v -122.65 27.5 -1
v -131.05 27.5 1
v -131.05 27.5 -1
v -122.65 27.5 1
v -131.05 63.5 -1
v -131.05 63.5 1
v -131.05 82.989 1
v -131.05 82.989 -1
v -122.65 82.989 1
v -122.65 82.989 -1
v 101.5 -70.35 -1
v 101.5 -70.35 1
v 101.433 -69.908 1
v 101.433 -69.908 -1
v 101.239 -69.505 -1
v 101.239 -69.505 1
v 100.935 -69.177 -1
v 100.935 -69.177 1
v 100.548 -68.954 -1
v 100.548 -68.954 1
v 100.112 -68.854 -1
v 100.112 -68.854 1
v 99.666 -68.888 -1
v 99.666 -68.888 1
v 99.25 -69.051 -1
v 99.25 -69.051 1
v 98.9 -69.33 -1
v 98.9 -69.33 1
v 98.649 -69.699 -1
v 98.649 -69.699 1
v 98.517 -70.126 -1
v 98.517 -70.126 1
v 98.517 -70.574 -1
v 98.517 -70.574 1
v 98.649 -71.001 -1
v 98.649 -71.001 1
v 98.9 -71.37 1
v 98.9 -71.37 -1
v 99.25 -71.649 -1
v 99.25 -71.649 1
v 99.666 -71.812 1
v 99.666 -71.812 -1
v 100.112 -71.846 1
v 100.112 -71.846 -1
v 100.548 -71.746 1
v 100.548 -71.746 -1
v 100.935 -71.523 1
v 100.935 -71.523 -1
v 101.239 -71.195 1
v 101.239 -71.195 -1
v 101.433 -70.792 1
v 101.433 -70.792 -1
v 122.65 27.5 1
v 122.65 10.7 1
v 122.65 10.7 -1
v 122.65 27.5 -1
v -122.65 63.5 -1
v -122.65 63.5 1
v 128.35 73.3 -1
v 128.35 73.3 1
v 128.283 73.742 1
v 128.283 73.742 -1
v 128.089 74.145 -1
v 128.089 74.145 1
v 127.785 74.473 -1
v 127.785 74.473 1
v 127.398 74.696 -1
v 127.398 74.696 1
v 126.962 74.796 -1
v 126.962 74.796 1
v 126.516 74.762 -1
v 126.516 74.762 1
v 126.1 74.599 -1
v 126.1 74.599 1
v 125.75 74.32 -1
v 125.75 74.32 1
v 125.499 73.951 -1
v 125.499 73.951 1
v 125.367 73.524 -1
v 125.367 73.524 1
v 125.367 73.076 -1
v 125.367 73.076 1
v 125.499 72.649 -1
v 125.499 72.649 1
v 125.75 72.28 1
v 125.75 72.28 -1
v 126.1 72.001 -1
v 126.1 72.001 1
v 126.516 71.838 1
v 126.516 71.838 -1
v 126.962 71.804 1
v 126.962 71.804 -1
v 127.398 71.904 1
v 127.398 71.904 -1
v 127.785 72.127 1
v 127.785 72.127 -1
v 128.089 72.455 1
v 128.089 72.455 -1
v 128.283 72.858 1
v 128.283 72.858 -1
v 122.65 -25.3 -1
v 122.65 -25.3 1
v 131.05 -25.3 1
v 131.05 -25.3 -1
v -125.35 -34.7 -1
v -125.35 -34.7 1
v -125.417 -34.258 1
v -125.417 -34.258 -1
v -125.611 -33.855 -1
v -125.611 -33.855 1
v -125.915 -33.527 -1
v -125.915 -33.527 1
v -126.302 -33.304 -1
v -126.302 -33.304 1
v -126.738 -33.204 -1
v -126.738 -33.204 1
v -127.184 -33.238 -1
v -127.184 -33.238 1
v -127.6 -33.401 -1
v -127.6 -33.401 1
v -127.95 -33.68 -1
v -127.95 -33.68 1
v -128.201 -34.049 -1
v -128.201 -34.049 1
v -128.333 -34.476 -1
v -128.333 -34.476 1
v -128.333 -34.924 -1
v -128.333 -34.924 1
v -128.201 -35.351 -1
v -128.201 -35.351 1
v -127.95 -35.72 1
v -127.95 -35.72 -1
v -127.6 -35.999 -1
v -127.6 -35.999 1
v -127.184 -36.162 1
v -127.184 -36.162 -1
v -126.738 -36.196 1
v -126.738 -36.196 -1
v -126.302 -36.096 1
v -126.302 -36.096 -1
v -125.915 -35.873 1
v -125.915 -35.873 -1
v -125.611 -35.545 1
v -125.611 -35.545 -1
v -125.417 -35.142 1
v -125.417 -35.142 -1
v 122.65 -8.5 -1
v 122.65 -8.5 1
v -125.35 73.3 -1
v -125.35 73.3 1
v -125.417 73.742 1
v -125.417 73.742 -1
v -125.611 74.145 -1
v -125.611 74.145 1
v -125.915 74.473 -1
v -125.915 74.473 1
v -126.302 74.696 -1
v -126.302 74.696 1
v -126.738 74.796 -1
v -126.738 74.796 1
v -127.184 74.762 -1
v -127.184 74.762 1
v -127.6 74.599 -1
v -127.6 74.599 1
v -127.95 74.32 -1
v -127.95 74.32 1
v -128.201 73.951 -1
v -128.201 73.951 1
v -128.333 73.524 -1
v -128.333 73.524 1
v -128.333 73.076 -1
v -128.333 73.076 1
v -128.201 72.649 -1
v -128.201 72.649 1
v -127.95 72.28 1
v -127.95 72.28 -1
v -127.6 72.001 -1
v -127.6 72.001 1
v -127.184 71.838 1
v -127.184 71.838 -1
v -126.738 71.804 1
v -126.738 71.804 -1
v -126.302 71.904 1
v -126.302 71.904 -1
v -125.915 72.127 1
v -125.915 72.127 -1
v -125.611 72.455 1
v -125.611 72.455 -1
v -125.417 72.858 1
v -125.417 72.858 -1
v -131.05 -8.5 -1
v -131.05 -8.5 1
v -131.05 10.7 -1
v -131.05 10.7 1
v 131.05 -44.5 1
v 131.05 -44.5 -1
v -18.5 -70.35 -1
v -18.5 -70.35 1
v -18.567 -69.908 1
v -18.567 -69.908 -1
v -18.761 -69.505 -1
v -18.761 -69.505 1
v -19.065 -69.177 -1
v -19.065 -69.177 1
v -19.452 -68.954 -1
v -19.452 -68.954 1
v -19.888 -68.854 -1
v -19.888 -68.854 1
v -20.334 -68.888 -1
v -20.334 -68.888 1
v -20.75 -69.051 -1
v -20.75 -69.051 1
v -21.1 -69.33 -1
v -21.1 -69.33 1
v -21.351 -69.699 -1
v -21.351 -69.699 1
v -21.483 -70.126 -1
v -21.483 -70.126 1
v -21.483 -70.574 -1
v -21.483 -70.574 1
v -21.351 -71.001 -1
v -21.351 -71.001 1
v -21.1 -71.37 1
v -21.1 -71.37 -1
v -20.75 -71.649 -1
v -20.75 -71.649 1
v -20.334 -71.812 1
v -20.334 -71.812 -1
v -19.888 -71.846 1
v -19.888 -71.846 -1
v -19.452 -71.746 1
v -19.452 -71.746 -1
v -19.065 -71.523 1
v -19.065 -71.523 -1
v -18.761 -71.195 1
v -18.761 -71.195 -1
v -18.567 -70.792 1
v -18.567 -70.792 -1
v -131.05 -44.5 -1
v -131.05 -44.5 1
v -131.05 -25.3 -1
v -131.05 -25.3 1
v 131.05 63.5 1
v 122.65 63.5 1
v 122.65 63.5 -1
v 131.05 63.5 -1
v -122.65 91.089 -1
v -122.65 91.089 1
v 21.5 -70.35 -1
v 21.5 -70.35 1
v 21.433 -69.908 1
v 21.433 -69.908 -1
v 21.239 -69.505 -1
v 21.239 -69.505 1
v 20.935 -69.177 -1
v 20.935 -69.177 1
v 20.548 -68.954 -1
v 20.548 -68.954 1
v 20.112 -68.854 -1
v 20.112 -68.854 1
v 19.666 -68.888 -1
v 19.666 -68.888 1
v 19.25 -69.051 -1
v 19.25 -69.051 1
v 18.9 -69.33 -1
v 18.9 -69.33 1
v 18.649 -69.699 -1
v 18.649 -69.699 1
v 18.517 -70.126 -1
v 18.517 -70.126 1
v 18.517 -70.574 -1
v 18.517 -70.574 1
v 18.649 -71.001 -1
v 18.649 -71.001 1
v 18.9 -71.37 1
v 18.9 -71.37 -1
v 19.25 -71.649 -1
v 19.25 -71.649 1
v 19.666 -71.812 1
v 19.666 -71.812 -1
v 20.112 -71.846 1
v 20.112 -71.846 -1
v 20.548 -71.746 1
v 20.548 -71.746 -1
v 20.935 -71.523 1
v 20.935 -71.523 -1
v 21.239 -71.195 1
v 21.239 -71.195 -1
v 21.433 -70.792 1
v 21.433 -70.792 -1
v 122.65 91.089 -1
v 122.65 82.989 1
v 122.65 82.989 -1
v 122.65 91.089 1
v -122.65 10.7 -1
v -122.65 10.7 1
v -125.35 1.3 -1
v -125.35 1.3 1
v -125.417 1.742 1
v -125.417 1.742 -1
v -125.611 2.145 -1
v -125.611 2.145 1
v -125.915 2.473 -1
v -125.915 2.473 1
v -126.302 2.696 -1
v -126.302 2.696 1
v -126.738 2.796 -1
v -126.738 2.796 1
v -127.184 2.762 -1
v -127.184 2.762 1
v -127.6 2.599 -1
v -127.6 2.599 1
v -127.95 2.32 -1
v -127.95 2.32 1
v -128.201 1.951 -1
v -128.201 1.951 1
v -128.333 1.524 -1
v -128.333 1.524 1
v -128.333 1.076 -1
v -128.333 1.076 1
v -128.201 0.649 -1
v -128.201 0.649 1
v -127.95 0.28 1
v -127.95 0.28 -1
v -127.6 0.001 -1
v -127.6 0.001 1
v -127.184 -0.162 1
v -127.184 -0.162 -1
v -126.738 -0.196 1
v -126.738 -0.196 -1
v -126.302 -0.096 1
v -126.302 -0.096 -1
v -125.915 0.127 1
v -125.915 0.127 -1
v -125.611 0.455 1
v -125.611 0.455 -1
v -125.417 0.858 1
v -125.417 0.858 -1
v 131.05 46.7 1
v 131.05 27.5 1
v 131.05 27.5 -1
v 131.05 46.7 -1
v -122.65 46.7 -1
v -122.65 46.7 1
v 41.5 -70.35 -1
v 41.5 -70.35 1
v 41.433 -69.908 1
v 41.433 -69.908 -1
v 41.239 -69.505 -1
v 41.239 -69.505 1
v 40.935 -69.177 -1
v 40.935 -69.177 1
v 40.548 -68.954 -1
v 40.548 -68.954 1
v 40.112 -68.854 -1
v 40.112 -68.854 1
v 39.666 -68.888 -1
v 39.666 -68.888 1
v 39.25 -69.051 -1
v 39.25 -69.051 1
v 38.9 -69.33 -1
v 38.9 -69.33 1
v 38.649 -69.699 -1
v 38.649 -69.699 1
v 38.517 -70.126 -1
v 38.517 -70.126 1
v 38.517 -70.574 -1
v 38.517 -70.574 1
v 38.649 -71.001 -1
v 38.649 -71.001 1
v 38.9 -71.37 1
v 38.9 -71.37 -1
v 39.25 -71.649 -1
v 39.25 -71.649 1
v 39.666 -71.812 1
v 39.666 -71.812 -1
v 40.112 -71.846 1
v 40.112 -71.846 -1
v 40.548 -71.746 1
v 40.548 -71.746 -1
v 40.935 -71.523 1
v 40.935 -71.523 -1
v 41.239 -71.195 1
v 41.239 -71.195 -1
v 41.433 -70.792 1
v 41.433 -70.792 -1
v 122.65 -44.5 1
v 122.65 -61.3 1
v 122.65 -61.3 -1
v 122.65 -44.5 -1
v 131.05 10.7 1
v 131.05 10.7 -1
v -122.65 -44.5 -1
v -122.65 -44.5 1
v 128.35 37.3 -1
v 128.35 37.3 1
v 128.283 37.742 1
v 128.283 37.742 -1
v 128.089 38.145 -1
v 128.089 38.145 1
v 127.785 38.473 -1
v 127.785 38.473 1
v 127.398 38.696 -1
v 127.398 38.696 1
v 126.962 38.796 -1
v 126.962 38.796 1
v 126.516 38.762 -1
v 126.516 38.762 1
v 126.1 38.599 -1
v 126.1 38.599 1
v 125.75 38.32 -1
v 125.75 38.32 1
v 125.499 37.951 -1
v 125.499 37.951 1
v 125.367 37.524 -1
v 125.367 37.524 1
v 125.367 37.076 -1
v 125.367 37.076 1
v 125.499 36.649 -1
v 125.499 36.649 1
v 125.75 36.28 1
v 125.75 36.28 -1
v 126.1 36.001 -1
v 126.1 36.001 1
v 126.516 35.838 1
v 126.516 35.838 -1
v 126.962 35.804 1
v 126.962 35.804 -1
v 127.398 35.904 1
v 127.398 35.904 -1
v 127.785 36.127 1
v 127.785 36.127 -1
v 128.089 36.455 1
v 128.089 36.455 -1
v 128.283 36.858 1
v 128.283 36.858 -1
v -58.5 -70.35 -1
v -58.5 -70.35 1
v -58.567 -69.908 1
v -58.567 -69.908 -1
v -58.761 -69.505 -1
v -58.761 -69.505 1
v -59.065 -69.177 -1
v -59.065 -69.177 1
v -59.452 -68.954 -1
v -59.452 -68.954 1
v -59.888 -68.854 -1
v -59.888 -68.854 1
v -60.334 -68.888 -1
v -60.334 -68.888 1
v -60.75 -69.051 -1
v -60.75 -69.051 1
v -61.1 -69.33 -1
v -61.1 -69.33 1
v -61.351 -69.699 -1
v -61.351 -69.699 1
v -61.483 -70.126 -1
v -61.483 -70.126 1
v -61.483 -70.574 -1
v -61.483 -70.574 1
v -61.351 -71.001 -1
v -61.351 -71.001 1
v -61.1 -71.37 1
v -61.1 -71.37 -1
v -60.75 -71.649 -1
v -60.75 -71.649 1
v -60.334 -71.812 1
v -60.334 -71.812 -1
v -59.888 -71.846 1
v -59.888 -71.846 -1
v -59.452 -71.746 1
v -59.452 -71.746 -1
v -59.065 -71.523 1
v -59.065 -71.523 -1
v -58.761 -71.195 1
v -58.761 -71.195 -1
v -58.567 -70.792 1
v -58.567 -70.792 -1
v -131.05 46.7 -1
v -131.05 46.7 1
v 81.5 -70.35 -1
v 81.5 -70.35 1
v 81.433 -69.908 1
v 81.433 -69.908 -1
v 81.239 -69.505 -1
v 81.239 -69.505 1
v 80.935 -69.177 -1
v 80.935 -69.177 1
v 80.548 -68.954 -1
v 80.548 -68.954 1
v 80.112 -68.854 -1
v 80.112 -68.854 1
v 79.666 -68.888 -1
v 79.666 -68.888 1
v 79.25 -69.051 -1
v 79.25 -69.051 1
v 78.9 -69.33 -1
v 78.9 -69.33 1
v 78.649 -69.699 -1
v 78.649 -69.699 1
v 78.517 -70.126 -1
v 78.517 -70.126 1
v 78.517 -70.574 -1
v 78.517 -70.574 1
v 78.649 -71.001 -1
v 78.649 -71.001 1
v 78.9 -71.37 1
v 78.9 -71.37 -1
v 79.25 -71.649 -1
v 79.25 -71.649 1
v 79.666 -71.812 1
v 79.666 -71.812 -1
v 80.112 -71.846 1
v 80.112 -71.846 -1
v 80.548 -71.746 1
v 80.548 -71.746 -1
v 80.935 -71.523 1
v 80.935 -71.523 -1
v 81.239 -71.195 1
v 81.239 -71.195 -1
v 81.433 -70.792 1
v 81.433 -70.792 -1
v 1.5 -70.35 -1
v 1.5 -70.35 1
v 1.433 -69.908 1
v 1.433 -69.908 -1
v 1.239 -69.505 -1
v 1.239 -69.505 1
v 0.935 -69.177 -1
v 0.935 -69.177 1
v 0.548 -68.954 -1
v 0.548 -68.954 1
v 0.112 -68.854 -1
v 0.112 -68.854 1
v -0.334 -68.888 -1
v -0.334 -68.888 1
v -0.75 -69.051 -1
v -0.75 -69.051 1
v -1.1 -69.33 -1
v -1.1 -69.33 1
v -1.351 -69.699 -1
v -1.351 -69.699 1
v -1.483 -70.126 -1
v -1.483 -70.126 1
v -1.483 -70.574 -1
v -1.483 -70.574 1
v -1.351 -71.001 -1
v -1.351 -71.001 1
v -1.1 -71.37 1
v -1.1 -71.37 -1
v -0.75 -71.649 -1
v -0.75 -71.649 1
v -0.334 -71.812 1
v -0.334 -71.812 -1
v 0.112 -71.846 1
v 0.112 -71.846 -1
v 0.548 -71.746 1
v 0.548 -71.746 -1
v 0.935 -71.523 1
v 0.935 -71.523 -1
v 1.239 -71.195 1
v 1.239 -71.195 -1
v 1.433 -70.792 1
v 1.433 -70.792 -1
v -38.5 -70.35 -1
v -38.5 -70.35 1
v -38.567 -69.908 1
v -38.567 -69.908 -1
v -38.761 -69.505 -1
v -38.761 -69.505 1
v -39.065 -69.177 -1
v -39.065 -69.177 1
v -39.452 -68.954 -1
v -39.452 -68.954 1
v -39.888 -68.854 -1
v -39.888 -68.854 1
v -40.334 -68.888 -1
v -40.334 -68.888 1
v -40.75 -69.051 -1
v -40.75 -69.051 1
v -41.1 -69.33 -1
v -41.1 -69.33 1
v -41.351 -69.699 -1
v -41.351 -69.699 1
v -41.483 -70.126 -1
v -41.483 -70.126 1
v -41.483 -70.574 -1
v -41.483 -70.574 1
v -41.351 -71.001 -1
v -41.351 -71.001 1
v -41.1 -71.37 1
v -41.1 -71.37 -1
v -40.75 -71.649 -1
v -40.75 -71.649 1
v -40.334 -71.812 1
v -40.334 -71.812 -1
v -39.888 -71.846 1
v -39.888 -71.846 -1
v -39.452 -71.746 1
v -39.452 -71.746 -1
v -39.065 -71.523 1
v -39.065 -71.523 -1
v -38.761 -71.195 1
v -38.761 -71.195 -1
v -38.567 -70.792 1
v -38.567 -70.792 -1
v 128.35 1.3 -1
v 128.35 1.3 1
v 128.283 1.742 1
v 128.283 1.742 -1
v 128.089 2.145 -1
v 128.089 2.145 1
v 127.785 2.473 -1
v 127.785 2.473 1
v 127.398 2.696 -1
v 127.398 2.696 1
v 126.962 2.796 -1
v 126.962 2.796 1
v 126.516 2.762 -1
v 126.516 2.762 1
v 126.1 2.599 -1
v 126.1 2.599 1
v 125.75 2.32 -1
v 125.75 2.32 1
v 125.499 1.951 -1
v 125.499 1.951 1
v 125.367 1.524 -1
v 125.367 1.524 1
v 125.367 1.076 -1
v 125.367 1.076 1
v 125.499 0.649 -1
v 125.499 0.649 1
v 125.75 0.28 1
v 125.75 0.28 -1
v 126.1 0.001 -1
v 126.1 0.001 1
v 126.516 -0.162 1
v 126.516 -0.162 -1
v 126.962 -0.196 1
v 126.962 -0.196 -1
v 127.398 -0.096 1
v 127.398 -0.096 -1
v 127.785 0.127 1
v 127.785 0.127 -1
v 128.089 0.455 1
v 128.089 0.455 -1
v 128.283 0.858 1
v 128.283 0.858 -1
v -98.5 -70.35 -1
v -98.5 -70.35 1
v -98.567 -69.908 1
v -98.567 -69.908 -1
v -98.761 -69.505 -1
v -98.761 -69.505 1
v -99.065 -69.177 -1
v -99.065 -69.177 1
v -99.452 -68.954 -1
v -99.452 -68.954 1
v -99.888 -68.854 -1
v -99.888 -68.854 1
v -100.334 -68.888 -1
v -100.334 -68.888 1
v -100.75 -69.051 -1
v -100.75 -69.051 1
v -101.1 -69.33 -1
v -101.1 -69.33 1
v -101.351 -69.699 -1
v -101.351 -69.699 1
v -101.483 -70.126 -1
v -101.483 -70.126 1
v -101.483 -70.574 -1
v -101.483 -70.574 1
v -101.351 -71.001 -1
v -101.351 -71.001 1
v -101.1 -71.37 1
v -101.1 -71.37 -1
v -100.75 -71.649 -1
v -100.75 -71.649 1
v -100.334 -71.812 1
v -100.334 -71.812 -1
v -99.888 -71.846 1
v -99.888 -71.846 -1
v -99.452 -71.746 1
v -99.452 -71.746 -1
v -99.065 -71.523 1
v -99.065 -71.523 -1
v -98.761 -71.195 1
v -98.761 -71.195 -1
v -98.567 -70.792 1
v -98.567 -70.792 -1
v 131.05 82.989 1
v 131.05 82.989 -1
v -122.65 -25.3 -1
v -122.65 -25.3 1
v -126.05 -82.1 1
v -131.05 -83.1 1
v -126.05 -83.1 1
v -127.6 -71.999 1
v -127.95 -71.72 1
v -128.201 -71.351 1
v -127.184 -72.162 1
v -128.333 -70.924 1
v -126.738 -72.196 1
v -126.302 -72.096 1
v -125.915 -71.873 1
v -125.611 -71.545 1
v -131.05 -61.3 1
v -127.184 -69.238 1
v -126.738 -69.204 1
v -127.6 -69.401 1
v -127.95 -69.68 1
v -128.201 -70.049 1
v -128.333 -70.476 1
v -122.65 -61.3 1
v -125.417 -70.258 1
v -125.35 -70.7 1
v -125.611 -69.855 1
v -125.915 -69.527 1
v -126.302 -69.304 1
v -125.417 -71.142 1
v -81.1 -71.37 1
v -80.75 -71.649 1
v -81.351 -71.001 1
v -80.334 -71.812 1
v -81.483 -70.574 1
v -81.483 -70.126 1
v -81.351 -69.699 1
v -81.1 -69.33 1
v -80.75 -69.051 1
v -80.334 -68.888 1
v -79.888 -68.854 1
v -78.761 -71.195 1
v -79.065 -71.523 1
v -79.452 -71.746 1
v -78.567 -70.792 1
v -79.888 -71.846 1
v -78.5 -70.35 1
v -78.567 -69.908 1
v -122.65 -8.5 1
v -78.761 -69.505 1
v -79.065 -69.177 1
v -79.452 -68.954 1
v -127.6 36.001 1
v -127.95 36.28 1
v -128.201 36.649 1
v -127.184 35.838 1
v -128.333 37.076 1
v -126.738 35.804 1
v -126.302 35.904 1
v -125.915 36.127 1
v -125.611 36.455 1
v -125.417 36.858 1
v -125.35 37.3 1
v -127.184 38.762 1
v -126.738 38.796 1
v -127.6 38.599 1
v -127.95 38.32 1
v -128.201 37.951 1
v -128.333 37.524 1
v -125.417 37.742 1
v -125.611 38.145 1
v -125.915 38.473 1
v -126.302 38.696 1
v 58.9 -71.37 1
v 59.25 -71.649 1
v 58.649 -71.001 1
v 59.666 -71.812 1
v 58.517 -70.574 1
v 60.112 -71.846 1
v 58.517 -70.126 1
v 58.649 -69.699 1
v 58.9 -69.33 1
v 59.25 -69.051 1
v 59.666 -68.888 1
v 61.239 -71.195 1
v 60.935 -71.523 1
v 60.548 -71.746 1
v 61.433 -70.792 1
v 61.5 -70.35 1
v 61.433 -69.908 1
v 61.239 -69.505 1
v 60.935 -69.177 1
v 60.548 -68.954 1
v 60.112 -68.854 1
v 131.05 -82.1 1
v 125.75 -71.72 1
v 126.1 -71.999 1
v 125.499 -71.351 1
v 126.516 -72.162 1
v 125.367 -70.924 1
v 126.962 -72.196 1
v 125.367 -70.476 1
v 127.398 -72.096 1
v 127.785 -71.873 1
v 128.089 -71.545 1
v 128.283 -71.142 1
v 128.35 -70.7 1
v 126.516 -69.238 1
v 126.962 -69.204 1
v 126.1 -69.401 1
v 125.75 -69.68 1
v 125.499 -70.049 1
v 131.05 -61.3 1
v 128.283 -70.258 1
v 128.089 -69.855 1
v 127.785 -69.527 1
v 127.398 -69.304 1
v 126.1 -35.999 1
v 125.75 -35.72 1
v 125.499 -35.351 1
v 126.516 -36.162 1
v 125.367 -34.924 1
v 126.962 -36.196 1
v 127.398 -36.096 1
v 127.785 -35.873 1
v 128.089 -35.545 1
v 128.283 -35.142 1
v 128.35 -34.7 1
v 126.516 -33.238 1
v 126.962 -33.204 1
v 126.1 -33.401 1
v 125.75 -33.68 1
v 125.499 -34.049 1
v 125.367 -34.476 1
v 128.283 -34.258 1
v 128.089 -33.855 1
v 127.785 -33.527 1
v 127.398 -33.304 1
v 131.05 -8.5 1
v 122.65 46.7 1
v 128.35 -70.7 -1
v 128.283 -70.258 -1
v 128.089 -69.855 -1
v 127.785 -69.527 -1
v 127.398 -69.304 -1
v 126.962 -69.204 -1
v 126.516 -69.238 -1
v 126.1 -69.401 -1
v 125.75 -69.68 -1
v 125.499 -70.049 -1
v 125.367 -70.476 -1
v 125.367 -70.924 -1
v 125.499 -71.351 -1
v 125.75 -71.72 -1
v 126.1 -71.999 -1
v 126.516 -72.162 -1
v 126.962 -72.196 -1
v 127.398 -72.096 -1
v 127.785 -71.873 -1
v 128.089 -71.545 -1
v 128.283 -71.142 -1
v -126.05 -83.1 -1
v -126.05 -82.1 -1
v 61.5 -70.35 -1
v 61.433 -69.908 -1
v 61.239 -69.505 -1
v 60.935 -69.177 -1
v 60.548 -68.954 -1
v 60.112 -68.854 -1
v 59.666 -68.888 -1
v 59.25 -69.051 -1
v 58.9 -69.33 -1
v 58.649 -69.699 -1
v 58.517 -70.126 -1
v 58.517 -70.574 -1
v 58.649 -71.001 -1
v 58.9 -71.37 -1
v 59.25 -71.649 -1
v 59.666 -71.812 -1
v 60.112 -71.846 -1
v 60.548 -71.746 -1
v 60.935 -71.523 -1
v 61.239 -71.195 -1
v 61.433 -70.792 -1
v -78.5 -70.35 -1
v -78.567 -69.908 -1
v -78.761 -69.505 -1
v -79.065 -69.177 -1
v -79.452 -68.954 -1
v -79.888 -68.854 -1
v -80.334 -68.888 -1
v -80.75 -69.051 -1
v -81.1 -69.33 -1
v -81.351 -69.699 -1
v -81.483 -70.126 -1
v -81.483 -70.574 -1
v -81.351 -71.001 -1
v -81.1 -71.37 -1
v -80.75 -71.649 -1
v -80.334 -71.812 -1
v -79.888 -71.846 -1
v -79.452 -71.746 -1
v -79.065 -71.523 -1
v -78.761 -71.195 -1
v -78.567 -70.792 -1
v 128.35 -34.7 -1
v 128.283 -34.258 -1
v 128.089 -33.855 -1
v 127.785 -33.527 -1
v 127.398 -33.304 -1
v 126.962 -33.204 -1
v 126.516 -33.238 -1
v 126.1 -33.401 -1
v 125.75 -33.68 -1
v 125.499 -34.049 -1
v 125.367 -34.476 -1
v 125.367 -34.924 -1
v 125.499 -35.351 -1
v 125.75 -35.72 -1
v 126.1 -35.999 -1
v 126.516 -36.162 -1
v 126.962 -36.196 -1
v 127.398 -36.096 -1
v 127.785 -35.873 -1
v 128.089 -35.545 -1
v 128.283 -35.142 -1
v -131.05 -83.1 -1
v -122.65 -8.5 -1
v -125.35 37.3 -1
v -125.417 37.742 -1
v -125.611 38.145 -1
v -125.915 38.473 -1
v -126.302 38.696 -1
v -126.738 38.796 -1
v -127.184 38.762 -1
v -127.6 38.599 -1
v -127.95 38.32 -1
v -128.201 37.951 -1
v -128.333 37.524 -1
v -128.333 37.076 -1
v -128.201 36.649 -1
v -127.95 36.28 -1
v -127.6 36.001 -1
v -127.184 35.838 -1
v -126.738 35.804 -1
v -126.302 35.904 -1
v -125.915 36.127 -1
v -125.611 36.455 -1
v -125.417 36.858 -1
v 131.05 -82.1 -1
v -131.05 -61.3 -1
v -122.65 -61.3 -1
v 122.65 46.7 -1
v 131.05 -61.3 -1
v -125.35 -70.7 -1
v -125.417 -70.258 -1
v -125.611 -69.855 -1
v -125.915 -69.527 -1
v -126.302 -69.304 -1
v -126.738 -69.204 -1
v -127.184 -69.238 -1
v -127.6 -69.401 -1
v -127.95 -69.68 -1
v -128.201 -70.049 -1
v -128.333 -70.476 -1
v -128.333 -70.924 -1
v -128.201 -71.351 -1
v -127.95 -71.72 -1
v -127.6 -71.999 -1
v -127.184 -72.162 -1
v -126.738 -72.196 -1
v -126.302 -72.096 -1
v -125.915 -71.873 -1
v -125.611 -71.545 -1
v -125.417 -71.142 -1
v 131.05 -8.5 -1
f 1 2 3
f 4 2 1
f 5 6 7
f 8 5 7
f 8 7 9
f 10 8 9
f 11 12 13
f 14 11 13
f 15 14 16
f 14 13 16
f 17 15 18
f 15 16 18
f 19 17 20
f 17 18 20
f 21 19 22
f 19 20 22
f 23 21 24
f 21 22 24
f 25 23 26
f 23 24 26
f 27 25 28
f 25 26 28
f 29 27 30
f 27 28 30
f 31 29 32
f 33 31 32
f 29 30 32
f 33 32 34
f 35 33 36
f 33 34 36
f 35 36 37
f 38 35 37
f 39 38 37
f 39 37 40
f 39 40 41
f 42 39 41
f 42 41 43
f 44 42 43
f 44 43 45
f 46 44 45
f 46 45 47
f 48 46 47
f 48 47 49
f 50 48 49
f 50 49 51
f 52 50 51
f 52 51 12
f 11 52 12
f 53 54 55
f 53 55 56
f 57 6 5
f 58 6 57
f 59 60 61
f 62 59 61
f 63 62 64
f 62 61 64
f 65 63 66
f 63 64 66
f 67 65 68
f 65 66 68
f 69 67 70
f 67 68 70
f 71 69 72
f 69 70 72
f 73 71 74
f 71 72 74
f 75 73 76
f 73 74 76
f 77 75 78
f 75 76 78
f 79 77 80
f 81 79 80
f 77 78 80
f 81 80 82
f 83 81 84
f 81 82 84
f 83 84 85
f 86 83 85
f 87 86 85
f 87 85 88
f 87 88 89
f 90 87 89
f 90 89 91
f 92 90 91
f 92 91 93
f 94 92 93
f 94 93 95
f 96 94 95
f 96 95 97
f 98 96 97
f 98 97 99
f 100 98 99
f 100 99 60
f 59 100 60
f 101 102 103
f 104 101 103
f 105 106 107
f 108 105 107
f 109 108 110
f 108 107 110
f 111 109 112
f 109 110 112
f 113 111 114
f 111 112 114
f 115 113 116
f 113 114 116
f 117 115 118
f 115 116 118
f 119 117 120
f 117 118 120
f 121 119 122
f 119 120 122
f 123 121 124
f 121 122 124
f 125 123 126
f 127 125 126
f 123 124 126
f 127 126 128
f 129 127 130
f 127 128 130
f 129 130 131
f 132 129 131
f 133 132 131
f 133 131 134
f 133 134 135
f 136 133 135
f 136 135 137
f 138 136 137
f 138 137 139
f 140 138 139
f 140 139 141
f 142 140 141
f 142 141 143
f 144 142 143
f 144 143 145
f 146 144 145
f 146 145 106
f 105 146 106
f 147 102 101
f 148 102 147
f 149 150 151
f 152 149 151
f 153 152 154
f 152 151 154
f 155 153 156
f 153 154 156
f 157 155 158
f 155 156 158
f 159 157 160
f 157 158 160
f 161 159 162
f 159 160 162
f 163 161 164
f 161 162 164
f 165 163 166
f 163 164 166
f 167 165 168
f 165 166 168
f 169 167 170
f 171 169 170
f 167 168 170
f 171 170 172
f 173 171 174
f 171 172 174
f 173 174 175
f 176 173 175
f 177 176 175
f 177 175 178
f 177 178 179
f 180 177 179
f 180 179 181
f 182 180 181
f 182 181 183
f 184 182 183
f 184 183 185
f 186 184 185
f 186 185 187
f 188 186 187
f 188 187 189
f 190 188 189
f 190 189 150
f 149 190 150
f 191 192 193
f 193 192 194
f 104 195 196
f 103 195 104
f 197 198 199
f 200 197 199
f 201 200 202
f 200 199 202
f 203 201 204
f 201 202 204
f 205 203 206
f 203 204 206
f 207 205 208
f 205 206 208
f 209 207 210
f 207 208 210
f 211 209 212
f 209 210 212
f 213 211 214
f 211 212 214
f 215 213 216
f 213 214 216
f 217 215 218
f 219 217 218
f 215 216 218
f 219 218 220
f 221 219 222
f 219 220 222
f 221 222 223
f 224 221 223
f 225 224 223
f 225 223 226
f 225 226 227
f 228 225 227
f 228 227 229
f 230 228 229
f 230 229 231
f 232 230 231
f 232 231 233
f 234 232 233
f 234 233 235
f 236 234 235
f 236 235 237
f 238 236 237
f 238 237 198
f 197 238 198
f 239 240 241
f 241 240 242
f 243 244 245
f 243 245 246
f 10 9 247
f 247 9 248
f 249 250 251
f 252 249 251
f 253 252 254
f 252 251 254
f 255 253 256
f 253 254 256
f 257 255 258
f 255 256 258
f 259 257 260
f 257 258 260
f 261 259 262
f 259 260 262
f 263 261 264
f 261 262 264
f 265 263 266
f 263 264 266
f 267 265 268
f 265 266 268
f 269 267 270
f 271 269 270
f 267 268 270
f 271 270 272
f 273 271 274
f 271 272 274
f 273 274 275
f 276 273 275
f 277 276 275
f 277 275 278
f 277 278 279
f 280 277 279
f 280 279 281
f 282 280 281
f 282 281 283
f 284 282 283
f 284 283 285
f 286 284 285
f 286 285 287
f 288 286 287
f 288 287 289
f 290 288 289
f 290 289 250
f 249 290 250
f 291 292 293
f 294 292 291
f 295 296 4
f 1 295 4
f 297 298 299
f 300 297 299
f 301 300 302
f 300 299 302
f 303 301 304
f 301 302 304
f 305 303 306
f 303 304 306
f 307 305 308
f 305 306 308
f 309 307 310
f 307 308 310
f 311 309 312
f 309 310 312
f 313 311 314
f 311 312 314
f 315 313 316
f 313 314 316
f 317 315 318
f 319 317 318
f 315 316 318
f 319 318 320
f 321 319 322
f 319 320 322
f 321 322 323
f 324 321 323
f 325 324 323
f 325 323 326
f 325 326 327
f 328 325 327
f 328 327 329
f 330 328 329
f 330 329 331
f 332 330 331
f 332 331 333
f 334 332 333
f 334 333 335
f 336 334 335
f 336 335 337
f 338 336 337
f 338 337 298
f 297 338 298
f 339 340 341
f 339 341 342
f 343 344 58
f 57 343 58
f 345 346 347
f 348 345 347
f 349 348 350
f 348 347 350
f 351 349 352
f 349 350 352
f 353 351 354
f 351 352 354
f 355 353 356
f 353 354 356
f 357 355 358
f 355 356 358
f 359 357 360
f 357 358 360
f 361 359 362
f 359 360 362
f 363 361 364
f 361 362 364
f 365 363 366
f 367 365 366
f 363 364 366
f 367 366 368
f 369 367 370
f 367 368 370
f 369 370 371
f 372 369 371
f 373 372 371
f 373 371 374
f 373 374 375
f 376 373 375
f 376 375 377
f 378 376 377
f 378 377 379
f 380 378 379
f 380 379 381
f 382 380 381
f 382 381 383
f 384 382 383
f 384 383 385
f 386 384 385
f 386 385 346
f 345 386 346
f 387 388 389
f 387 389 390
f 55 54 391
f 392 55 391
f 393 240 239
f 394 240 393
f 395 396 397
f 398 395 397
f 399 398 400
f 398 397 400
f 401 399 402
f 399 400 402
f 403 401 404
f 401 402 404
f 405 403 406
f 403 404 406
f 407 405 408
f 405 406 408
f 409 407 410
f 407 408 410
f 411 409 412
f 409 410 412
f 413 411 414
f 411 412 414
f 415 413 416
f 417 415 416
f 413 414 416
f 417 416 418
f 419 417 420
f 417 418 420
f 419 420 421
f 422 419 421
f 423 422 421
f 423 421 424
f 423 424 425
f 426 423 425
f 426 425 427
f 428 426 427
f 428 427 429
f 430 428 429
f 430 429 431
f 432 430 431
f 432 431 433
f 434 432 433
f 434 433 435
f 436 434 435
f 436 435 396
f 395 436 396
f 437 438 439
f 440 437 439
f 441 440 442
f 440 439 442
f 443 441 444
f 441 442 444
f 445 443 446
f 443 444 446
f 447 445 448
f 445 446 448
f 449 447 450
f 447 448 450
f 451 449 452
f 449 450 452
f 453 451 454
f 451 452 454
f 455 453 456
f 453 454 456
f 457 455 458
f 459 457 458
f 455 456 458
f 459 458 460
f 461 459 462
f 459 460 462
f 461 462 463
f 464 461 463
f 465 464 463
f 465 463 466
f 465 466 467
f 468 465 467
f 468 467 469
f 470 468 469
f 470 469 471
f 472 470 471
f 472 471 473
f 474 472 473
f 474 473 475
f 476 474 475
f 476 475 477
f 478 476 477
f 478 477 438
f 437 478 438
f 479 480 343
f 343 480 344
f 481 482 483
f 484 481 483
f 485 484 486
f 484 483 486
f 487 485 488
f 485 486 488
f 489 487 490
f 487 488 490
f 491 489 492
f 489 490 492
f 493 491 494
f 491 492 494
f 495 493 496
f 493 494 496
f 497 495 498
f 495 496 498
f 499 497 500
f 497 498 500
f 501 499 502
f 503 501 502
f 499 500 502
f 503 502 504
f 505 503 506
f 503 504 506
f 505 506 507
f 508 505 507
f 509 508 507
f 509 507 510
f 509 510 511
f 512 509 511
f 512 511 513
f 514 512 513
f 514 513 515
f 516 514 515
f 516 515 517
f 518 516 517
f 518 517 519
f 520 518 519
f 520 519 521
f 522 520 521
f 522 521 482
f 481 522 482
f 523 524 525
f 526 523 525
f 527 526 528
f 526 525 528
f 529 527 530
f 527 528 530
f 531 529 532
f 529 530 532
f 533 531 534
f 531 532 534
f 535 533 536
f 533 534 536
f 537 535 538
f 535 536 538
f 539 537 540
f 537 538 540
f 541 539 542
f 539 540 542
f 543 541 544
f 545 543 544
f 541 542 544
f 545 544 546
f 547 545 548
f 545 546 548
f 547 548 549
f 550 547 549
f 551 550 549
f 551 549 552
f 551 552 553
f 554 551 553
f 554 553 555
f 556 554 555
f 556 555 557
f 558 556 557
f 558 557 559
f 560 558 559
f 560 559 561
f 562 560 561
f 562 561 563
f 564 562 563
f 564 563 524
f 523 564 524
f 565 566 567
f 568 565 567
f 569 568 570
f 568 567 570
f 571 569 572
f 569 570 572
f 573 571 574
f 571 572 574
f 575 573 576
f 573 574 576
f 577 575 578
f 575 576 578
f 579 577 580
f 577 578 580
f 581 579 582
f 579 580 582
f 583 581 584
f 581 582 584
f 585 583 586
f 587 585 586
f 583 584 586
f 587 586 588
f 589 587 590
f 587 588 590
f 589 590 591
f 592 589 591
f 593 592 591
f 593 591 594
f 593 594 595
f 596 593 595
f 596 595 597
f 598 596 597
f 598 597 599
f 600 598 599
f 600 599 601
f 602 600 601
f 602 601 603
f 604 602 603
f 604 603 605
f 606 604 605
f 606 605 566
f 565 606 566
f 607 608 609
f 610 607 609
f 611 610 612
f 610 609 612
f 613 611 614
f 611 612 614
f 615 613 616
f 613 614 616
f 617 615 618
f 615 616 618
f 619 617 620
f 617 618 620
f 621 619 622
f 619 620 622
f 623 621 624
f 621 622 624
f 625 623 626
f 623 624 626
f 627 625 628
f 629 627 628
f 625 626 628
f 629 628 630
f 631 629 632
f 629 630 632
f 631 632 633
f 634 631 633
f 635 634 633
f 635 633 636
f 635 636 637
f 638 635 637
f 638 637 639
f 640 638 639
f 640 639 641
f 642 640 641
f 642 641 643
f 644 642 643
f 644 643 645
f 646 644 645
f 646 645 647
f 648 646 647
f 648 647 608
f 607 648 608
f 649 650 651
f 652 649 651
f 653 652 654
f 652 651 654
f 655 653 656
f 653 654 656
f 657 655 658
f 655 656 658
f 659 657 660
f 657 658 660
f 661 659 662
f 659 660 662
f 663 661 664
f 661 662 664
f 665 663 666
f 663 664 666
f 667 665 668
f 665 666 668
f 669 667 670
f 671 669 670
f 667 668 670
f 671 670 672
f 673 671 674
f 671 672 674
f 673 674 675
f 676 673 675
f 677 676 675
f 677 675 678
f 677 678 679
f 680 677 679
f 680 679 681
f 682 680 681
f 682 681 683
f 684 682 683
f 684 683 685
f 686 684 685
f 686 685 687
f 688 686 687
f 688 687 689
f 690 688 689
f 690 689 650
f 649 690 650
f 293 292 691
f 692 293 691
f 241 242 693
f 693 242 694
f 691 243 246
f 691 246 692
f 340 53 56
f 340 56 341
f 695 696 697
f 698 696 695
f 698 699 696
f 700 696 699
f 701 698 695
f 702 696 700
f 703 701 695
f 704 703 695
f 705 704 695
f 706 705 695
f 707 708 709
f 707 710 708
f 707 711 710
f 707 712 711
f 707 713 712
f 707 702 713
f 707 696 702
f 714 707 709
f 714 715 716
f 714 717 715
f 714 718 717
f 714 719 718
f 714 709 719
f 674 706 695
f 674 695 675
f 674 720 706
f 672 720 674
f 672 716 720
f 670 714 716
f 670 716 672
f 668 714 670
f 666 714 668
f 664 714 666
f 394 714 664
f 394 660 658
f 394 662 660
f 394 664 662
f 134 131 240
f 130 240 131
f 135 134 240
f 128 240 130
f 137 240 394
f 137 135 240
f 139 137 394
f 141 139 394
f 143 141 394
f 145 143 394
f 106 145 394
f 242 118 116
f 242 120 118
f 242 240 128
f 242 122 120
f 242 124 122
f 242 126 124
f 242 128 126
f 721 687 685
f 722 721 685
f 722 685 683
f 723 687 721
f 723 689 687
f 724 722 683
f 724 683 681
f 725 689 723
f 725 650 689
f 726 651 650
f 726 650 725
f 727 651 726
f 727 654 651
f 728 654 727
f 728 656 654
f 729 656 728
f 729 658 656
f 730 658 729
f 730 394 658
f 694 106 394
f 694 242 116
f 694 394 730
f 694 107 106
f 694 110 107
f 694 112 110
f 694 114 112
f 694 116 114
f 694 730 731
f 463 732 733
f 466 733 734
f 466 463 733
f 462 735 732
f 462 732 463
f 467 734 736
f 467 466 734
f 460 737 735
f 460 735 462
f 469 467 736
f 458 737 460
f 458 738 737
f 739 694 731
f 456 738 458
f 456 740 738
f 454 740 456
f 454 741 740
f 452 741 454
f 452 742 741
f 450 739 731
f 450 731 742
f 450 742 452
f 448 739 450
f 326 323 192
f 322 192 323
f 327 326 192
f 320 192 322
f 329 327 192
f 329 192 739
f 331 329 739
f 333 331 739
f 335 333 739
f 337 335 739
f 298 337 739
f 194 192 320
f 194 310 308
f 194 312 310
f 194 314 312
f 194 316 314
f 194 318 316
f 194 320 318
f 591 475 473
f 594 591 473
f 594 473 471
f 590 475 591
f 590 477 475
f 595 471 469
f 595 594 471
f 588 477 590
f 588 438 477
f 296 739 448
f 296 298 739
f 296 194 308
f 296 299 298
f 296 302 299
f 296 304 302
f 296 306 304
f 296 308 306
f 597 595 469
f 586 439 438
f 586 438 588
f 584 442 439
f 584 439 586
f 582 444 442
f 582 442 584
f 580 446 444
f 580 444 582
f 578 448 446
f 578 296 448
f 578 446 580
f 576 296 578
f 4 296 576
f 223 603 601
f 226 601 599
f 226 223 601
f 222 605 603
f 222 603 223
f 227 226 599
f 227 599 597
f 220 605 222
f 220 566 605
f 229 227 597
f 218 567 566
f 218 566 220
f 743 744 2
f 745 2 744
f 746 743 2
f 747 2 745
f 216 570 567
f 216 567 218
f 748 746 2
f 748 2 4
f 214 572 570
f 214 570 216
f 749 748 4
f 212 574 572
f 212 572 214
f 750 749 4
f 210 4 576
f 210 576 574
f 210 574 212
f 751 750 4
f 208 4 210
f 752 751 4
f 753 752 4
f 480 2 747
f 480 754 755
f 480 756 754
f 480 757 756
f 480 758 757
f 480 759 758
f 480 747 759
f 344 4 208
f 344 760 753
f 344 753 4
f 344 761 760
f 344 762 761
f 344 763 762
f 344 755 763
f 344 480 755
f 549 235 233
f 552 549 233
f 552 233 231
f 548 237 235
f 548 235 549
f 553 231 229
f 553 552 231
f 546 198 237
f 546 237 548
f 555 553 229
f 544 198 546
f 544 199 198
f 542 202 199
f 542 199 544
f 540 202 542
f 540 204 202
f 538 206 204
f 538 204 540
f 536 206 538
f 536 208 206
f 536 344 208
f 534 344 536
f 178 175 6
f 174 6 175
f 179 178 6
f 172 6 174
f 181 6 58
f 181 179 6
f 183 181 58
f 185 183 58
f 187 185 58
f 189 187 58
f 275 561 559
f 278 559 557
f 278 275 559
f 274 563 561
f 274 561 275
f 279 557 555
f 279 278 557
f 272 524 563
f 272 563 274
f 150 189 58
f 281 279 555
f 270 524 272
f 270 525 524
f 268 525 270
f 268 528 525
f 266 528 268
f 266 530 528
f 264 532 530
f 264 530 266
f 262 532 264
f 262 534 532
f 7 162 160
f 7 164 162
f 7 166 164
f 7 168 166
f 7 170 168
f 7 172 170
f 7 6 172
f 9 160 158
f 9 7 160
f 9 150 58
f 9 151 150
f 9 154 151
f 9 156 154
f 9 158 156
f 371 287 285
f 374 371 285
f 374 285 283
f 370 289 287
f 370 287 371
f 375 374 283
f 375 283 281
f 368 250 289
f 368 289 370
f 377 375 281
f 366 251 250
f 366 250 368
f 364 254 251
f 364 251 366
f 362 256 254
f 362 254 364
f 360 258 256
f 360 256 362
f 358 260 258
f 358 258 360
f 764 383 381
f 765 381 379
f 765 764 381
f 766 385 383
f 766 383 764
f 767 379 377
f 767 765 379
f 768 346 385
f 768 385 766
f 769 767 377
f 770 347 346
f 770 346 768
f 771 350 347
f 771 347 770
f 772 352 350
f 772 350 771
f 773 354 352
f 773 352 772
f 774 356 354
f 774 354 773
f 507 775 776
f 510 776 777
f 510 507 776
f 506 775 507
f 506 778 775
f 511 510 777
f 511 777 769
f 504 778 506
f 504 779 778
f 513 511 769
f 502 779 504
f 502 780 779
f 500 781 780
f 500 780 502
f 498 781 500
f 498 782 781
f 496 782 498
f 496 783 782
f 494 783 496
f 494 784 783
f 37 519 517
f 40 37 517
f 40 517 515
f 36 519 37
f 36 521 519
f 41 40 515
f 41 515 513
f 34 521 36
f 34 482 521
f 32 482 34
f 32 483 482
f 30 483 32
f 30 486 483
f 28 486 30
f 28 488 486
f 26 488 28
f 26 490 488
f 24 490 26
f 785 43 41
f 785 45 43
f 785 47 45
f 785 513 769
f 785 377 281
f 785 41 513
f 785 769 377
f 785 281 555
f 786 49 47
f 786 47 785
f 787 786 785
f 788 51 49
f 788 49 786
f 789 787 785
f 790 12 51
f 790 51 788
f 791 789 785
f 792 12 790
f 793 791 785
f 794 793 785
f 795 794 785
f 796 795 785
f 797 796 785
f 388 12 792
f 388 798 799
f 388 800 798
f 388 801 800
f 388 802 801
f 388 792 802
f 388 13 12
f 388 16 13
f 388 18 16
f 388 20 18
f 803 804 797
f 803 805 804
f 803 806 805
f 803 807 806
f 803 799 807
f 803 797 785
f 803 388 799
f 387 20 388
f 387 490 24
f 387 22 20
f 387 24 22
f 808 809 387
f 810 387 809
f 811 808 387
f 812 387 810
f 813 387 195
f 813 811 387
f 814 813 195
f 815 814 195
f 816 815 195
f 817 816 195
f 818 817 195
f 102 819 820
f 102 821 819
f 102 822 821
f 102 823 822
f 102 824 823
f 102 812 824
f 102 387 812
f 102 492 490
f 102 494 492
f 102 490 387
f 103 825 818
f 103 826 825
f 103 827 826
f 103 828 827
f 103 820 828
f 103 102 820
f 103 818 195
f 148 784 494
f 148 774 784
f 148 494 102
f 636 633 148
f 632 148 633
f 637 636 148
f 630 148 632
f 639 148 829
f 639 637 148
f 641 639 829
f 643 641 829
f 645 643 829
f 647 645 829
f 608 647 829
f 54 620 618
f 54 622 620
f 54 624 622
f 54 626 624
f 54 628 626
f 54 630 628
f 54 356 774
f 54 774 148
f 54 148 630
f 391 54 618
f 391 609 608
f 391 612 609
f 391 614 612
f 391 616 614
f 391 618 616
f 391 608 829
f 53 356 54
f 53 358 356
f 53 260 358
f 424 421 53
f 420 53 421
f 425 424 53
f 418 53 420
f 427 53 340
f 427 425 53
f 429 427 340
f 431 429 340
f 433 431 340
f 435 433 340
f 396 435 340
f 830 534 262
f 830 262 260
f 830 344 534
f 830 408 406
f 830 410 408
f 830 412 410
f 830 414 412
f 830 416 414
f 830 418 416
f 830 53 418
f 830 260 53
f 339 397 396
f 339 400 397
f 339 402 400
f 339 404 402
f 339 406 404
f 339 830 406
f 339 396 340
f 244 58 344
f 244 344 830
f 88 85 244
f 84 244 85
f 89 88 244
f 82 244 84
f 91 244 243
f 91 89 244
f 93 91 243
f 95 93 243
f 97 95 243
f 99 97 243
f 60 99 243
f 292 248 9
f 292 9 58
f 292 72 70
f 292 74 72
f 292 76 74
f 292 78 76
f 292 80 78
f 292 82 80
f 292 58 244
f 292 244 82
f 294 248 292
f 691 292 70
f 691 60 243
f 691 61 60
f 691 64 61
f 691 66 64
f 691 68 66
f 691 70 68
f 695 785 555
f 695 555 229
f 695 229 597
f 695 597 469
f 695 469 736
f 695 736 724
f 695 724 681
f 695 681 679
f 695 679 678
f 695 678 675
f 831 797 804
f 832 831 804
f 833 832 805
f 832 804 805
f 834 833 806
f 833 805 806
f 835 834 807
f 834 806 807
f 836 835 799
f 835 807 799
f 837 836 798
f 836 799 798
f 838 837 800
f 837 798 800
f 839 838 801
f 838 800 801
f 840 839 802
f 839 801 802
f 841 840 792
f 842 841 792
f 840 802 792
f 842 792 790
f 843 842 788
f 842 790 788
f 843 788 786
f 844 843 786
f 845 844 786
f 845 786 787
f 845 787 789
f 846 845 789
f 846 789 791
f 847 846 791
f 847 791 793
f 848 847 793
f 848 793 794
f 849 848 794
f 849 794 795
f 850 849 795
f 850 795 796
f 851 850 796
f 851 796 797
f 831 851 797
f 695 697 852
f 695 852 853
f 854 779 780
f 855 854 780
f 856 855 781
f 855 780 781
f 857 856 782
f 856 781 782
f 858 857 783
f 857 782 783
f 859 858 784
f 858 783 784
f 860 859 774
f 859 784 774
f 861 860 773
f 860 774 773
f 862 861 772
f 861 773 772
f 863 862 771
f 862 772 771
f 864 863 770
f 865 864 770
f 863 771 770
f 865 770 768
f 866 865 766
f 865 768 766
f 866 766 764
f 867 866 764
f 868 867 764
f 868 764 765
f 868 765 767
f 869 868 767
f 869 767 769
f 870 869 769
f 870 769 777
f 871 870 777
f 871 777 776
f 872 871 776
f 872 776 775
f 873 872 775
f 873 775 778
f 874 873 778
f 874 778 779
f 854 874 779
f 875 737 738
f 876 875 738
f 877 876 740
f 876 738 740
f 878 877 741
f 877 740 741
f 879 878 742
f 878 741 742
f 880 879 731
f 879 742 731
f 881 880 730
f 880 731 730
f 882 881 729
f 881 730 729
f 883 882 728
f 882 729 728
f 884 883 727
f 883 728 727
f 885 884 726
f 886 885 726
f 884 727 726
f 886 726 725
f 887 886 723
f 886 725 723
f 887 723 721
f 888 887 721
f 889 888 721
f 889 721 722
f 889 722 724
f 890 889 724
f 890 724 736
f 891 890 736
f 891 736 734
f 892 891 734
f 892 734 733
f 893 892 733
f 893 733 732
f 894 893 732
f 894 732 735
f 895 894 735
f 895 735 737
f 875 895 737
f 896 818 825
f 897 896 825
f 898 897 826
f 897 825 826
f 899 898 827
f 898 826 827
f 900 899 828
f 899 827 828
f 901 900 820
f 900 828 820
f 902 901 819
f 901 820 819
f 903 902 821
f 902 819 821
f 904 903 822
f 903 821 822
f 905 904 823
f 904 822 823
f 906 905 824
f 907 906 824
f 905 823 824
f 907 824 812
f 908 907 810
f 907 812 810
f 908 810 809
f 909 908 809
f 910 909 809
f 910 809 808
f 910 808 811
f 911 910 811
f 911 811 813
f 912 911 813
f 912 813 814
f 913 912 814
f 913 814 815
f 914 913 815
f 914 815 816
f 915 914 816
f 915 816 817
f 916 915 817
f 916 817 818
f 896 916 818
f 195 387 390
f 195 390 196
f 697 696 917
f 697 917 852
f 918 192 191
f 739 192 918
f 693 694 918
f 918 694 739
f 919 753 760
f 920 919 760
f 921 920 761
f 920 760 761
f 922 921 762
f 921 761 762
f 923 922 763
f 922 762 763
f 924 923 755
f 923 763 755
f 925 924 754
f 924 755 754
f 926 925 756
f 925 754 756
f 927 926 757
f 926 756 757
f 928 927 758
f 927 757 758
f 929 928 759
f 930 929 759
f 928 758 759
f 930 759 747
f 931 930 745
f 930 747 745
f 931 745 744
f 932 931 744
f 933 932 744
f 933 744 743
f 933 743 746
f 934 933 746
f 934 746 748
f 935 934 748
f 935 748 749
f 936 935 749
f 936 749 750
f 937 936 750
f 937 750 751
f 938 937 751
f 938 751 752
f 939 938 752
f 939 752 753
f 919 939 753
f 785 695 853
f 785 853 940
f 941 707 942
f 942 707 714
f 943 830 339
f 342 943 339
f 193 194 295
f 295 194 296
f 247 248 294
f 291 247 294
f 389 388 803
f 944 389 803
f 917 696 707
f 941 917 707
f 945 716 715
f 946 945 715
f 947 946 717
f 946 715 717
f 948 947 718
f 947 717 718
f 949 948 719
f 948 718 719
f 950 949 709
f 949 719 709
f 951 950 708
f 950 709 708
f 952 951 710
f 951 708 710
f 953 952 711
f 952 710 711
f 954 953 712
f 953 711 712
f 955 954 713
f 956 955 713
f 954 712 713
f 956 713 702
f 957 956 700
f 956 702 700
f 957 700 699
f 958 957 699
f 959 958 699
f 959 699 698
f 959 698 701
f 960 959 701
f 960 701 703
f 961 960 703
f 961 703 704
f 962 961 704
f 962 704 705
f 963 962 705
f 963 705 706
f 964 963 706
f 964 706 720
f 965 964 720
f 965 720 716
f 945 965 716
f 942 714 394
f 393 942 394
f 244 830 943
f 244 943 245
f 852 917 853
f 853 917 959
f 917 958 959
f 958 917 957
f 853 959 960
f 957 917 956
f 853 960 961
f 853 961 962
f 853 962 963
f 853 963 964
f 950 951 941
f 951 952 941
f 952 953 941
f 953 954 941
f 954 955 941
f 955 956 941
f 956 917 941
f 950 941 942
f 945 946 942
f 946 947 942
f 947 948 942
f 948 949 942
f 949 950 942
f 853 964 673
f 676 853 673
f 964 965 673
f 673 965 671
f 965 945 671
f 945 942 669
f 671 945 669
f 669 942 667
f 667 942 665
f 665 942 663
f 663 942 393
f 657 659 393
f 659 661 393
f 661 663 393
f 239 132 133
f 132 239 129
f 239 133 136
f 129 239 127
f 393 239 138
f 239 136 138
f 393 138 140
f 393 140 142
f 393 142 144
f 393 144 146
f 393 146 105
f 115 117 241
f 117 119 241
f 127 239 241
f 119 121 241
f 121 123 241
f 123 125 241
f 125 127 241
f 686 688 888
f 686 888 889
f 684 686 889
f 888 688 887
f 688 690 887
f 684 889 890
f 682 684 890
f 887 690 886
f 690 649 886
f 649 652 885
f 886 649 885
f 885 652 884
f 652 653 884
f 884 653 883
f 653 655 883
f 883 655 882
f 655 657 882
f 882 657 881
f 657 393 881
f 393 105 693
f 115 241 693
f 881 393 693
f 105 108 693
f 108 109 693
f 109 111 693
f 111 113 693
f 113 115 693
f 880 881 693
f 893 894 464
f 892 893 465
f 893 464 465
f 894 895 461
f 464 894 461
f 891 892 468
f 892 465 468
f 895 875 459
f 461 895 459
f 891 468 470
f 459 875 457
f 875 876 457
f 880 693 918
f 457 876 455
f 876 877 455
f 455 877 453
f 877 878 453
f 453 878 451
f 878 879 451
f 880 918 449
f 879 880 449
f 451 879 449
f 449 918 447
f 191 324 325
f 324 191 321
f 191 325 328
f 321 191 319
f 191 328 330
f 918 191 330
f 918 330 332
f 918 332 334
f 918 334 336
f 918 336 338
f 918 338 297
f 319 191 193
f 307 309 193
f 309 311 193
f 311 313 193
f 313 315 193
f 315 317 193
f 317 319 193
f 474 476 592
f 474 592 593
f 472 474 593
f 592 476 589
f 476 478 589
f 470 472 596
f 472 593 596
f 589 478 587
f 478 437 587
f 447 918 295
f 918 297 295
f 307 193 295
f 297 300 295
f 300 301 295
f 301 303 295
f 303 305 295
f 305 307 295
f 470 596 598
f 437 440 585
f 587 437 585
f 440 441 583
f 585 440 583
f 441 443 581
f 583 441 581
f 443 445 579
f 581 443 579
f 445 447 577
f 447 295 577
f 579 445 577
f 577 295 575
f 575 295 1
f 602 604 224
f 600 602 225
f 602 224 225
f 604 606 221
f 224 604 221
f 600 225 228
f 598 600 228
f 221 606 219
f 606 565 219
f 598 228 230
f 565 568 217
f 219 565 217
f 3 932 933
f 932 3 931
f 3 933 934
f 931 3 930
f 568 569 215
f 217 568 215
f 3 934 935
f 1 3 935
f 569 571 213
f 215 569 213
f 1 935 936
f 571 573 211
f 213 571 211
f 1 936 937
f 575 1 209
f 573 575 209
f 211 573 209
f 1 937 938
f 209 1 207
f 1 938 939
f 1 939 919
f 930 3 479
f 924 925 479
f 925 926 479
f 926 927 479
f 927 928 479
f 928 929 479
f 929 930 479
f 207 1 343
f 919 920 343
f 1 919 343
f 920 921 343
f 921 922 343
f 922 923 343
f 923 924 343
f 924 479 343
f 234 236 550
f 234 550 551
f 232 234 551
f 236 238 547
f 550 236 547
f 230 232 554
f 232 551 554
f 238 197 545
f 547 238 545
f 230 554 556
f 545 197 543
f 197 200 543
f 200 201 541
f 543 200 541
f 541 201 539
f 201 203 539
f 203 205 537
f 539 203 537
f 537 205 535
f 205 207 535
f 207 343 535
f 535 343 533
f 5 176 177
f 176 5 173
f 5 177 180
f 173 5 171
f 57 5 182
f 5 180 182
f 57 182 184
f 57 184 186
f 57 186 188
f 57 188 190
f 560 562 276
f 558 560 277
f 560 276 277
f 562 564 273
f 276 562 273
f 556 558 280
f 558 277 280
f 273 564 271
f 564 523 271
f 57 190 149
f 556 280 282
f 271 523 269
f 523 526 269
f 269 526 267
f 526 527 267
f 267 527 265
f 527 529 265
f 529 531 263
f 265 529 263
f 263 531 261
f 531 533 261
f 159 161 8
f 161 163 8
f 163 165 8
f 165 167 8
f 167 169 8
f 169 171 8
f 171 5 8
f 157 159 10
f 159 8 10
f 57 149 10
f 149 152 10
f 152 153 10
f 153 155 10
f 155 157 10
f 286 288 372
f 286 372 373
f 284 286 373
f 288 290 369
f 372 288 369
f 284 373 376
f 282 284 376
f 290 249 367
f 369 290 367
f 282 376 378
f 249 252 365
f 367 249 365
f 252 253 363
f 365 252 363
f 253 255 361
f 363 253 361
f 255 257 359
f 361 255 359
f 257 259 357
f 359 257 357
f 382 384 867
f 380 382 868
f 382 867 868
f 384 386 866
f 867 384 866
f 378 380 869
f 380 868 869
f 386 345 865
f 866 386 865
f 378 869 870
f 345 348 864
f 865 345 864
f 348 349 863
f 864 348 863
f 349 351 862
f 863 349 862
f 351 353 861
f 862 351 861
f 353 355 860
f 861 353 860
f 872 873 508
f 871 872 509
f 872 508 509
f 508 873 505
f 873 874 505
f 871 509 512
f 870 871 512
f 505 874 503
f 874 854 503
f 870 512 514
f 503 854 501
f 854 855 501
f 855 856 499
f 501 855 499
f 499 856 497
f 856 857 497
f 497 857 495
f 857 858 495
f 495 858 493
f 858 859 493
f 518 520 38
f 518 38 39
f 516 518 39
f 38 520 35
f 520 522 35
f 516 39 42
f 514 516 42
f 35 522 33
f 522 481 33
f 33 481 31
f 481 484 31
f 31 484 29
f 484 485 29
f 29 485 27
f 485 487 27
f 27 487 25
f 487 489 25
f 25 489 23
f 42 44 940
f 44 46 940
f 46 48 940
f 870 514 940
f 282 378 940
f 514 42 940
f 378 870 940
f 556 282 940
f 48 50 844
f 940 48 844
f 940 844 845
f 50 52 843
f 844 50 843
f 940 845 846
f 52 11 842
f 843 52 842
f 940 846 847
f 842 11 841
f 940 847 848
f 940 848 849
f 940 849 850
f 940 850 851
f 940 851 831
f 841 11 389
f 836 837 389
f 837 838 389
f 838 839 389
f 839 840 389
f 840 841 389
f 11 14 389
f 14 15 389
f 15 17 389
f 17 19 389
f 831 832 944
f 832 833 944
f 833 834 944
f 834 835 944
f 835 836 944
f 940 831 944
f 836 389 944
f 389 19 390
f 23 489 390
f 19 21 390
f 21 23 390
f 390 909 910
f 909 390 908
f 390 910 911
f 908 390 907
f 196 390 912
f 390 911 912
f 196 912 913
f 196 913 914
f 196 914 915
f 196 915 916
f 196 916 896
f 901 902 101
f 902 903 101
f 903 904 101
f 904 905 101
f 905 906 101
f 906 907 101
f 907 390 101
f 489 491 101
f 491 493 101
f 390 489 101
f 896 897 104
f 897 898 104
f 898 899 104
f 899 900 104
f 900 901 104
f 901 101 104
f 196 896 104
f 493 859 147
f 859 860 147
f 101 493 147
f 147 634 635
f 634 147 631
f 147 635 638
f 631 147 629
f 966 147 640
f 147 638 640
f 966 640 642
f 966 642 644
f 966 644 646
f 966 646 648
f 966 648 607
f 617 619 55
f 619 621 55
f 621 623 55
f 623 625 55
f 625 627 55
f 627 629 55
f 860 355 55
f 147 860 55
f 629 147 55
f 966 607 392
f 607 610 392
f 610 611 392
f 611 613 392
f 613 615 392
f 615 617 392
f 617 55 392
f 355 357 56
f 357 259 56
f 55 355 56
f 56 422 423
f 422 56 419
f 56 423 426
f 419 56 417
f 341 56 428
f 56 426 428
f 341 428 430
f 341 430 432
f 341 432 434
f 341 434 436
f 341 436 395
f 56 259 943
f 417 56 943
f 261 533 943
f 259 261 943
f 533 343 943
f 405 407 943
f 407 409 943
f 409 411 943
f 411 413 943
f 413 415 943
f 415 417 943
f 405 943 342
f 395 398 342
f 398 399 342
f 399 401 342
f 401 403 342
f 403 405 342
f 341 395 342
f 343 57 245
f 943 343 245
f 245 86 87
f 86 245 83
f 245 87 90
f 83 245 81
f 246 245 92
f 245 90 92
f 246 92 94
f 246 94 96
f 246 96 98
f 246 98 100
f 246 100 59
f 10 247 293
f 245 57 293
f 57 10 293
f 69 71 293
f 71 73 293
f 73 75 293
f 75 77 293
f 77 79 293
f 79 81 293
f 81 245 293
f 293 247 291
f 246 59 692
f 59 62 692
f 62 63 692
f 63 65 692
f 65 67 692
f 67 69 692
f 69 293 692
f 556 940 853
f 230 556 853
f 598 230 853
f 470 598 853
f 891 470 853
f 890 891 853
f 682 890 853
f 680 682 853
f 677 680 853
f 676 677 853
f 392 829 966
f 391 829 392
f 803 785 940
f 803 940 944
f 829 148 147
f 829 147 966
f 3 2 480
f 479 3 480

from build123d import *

# Parameters (mm, degrees)
SKETCH_1_W          = 262.1
SKETCH_1_H          = 166.2
EXTRUDE_1_DEPTH     = 1
SKETCH_2_R          = 1.5
SKETCH_2_W          = 8.4
SKETCH_2_H          = 16.8
SKETCH_2_W_2        = 262.1
SKETCH_2_H_2        = 0.2
SKETCH_2_W_3        = 257.1
SKETCH_2_H_3        = 1
CUT_EXTRUDE1_DEPTH  = 10
SKETCH1_R           = 1.5
CUT_EXTRUDE2_DEPTH  = 10
SKETCH2_W           = 245.3
SKETCH2_H           = 8.1
BOSS_EXTRUDE1_DEPTH = 2


with BuildPart() as part:
    # 草图1 → 凸台-拉伸1 (new, symmetric)
    with BuildSketch(Plane.XY):
        Rectangle(SKETCH_1_W, SKETCH_1_H)
    extrude(amount=EXTRUDE_1_DEPTH, both=True)

    # 草图2 → Cut-Extrude1 (cut)
    with BuildSketch(Plane.XY.offset(1)):
        with Locations((-126.85, 73.3)):
            Circle(SKETCH_2_R)
        with Locations((-126.85, 37.3)):
            Circle(SKETCH_2_R)
        with Locations((-126.85, 1.3)):
            Circle(SKETCH_2_R)
        with Locations((-126.85, -34.7)):
            Circle(SKETCH_2_R)
        with Locations((-126.85, -70.7)):
            Circle(SKETCH_2_R)
        with Locations((126.85, -70.7)):
            Circle(SKETCH_2_R)
        with Locations((126.85, -34.7)):
            Circle(SKETCH_2_R)
        with Locations((126.85, 1.3)):
            Circle(SKETCH_2_R)
        with Locations((126.85, 37.3)):
            Circle(SKETCH_2_R)
        with Locations((126.85, 73.3)):
            Circle(SKETCH_2_R)
        with Locations((-126.85, 55.1)):
            Rectangle(SKETCH_2_W, SKETCH_2_H)
        with Locations((-126.85, 19.1)):
            Rectangle(SKETCH_2_W, SKETCH_2_H)
        with Locations((-126.85, -16.9)):
            Rectangle(SKETCH_2_W, SKETCH_2_H)
        with Locations((-126.85, -52.9)):
            Rectangle(SKETCH_2_W, SKETCH_2_H)
        with Locations((126.85, -52.9)):
            Rectangle(SKETCH_2_W, SKETCH_2_H)
        with Locations((126.85, -16.9)):
            Rectangle(SKETCH_2_W, SKETCH_2_H)
        with Locations((126.85, 19.1)):
            Rectangle(SKETCH_2_W, SKETCH_2_H)
        with Locations((126.85, 55.1)):
            Rectangle(SKETCH_2_W, SKETCH_2_H)
        with Locations((0, 83.089141708)):
            Rectangle(SKETCH_2_W_2, SKETCH_2_H_2)
        with Locations((2.5, -82.6)):
            Rectangle(SKETCH_2_W_3, SKETCH_2_H_3)
    extrude(amount=-CUT_EXTRUDE1_DEPTH, mode=Mode.SUBTRACT)

    # Sketch1 → Cut-Extrude2 (cut)
    with BuildSketch(Plane.XY.offset(1)):
        with Locations((100, -70.35)):
            Circle(SKETCH1_R)
        with Locations((80, -70.35)):
            Circle(SKETCH1_R)
        with Locations((60, -70.35)):
            Circle(SKETCH1_R)
        with Locations((40, -70.35)):
            Circle(SKETCH1_R)
        with Locations((20, -70.35)):
            Circle(SKETCH1_R)
        with Locations((0, -70.35)):
            Circle(SKETCH1_R)
        with Locations((-20, -70.35)):
            Circle(SKETCH1_R)
        with Locations((-40, -70.35)):
            Circle(SKETCH1_R)
        with Locations((-60, -70.35)):
            Circle(SKETCH1_R)
        with Locations((-80, -70.35)):
            Circle(SKETCH1_R)
        with Locations((-100, -70.35)):
            Circle(SKETCH1_R)
    extrude(amount=-CUT_EXTRUDE2_DEPTH, mode=Mode.SUBTRACT)

    # Sketch2 → Boss-Extrude1 (add)
    with BuildSketch(Plane.XY.offset(1)):
        with Locations((0, 87.039141708)):
            Rectangle(SKETCH2_W, SKETCH2_H)
    extrude(amount=-BOSS_EXTRUDE1_DEPTH)


solid = part.part
